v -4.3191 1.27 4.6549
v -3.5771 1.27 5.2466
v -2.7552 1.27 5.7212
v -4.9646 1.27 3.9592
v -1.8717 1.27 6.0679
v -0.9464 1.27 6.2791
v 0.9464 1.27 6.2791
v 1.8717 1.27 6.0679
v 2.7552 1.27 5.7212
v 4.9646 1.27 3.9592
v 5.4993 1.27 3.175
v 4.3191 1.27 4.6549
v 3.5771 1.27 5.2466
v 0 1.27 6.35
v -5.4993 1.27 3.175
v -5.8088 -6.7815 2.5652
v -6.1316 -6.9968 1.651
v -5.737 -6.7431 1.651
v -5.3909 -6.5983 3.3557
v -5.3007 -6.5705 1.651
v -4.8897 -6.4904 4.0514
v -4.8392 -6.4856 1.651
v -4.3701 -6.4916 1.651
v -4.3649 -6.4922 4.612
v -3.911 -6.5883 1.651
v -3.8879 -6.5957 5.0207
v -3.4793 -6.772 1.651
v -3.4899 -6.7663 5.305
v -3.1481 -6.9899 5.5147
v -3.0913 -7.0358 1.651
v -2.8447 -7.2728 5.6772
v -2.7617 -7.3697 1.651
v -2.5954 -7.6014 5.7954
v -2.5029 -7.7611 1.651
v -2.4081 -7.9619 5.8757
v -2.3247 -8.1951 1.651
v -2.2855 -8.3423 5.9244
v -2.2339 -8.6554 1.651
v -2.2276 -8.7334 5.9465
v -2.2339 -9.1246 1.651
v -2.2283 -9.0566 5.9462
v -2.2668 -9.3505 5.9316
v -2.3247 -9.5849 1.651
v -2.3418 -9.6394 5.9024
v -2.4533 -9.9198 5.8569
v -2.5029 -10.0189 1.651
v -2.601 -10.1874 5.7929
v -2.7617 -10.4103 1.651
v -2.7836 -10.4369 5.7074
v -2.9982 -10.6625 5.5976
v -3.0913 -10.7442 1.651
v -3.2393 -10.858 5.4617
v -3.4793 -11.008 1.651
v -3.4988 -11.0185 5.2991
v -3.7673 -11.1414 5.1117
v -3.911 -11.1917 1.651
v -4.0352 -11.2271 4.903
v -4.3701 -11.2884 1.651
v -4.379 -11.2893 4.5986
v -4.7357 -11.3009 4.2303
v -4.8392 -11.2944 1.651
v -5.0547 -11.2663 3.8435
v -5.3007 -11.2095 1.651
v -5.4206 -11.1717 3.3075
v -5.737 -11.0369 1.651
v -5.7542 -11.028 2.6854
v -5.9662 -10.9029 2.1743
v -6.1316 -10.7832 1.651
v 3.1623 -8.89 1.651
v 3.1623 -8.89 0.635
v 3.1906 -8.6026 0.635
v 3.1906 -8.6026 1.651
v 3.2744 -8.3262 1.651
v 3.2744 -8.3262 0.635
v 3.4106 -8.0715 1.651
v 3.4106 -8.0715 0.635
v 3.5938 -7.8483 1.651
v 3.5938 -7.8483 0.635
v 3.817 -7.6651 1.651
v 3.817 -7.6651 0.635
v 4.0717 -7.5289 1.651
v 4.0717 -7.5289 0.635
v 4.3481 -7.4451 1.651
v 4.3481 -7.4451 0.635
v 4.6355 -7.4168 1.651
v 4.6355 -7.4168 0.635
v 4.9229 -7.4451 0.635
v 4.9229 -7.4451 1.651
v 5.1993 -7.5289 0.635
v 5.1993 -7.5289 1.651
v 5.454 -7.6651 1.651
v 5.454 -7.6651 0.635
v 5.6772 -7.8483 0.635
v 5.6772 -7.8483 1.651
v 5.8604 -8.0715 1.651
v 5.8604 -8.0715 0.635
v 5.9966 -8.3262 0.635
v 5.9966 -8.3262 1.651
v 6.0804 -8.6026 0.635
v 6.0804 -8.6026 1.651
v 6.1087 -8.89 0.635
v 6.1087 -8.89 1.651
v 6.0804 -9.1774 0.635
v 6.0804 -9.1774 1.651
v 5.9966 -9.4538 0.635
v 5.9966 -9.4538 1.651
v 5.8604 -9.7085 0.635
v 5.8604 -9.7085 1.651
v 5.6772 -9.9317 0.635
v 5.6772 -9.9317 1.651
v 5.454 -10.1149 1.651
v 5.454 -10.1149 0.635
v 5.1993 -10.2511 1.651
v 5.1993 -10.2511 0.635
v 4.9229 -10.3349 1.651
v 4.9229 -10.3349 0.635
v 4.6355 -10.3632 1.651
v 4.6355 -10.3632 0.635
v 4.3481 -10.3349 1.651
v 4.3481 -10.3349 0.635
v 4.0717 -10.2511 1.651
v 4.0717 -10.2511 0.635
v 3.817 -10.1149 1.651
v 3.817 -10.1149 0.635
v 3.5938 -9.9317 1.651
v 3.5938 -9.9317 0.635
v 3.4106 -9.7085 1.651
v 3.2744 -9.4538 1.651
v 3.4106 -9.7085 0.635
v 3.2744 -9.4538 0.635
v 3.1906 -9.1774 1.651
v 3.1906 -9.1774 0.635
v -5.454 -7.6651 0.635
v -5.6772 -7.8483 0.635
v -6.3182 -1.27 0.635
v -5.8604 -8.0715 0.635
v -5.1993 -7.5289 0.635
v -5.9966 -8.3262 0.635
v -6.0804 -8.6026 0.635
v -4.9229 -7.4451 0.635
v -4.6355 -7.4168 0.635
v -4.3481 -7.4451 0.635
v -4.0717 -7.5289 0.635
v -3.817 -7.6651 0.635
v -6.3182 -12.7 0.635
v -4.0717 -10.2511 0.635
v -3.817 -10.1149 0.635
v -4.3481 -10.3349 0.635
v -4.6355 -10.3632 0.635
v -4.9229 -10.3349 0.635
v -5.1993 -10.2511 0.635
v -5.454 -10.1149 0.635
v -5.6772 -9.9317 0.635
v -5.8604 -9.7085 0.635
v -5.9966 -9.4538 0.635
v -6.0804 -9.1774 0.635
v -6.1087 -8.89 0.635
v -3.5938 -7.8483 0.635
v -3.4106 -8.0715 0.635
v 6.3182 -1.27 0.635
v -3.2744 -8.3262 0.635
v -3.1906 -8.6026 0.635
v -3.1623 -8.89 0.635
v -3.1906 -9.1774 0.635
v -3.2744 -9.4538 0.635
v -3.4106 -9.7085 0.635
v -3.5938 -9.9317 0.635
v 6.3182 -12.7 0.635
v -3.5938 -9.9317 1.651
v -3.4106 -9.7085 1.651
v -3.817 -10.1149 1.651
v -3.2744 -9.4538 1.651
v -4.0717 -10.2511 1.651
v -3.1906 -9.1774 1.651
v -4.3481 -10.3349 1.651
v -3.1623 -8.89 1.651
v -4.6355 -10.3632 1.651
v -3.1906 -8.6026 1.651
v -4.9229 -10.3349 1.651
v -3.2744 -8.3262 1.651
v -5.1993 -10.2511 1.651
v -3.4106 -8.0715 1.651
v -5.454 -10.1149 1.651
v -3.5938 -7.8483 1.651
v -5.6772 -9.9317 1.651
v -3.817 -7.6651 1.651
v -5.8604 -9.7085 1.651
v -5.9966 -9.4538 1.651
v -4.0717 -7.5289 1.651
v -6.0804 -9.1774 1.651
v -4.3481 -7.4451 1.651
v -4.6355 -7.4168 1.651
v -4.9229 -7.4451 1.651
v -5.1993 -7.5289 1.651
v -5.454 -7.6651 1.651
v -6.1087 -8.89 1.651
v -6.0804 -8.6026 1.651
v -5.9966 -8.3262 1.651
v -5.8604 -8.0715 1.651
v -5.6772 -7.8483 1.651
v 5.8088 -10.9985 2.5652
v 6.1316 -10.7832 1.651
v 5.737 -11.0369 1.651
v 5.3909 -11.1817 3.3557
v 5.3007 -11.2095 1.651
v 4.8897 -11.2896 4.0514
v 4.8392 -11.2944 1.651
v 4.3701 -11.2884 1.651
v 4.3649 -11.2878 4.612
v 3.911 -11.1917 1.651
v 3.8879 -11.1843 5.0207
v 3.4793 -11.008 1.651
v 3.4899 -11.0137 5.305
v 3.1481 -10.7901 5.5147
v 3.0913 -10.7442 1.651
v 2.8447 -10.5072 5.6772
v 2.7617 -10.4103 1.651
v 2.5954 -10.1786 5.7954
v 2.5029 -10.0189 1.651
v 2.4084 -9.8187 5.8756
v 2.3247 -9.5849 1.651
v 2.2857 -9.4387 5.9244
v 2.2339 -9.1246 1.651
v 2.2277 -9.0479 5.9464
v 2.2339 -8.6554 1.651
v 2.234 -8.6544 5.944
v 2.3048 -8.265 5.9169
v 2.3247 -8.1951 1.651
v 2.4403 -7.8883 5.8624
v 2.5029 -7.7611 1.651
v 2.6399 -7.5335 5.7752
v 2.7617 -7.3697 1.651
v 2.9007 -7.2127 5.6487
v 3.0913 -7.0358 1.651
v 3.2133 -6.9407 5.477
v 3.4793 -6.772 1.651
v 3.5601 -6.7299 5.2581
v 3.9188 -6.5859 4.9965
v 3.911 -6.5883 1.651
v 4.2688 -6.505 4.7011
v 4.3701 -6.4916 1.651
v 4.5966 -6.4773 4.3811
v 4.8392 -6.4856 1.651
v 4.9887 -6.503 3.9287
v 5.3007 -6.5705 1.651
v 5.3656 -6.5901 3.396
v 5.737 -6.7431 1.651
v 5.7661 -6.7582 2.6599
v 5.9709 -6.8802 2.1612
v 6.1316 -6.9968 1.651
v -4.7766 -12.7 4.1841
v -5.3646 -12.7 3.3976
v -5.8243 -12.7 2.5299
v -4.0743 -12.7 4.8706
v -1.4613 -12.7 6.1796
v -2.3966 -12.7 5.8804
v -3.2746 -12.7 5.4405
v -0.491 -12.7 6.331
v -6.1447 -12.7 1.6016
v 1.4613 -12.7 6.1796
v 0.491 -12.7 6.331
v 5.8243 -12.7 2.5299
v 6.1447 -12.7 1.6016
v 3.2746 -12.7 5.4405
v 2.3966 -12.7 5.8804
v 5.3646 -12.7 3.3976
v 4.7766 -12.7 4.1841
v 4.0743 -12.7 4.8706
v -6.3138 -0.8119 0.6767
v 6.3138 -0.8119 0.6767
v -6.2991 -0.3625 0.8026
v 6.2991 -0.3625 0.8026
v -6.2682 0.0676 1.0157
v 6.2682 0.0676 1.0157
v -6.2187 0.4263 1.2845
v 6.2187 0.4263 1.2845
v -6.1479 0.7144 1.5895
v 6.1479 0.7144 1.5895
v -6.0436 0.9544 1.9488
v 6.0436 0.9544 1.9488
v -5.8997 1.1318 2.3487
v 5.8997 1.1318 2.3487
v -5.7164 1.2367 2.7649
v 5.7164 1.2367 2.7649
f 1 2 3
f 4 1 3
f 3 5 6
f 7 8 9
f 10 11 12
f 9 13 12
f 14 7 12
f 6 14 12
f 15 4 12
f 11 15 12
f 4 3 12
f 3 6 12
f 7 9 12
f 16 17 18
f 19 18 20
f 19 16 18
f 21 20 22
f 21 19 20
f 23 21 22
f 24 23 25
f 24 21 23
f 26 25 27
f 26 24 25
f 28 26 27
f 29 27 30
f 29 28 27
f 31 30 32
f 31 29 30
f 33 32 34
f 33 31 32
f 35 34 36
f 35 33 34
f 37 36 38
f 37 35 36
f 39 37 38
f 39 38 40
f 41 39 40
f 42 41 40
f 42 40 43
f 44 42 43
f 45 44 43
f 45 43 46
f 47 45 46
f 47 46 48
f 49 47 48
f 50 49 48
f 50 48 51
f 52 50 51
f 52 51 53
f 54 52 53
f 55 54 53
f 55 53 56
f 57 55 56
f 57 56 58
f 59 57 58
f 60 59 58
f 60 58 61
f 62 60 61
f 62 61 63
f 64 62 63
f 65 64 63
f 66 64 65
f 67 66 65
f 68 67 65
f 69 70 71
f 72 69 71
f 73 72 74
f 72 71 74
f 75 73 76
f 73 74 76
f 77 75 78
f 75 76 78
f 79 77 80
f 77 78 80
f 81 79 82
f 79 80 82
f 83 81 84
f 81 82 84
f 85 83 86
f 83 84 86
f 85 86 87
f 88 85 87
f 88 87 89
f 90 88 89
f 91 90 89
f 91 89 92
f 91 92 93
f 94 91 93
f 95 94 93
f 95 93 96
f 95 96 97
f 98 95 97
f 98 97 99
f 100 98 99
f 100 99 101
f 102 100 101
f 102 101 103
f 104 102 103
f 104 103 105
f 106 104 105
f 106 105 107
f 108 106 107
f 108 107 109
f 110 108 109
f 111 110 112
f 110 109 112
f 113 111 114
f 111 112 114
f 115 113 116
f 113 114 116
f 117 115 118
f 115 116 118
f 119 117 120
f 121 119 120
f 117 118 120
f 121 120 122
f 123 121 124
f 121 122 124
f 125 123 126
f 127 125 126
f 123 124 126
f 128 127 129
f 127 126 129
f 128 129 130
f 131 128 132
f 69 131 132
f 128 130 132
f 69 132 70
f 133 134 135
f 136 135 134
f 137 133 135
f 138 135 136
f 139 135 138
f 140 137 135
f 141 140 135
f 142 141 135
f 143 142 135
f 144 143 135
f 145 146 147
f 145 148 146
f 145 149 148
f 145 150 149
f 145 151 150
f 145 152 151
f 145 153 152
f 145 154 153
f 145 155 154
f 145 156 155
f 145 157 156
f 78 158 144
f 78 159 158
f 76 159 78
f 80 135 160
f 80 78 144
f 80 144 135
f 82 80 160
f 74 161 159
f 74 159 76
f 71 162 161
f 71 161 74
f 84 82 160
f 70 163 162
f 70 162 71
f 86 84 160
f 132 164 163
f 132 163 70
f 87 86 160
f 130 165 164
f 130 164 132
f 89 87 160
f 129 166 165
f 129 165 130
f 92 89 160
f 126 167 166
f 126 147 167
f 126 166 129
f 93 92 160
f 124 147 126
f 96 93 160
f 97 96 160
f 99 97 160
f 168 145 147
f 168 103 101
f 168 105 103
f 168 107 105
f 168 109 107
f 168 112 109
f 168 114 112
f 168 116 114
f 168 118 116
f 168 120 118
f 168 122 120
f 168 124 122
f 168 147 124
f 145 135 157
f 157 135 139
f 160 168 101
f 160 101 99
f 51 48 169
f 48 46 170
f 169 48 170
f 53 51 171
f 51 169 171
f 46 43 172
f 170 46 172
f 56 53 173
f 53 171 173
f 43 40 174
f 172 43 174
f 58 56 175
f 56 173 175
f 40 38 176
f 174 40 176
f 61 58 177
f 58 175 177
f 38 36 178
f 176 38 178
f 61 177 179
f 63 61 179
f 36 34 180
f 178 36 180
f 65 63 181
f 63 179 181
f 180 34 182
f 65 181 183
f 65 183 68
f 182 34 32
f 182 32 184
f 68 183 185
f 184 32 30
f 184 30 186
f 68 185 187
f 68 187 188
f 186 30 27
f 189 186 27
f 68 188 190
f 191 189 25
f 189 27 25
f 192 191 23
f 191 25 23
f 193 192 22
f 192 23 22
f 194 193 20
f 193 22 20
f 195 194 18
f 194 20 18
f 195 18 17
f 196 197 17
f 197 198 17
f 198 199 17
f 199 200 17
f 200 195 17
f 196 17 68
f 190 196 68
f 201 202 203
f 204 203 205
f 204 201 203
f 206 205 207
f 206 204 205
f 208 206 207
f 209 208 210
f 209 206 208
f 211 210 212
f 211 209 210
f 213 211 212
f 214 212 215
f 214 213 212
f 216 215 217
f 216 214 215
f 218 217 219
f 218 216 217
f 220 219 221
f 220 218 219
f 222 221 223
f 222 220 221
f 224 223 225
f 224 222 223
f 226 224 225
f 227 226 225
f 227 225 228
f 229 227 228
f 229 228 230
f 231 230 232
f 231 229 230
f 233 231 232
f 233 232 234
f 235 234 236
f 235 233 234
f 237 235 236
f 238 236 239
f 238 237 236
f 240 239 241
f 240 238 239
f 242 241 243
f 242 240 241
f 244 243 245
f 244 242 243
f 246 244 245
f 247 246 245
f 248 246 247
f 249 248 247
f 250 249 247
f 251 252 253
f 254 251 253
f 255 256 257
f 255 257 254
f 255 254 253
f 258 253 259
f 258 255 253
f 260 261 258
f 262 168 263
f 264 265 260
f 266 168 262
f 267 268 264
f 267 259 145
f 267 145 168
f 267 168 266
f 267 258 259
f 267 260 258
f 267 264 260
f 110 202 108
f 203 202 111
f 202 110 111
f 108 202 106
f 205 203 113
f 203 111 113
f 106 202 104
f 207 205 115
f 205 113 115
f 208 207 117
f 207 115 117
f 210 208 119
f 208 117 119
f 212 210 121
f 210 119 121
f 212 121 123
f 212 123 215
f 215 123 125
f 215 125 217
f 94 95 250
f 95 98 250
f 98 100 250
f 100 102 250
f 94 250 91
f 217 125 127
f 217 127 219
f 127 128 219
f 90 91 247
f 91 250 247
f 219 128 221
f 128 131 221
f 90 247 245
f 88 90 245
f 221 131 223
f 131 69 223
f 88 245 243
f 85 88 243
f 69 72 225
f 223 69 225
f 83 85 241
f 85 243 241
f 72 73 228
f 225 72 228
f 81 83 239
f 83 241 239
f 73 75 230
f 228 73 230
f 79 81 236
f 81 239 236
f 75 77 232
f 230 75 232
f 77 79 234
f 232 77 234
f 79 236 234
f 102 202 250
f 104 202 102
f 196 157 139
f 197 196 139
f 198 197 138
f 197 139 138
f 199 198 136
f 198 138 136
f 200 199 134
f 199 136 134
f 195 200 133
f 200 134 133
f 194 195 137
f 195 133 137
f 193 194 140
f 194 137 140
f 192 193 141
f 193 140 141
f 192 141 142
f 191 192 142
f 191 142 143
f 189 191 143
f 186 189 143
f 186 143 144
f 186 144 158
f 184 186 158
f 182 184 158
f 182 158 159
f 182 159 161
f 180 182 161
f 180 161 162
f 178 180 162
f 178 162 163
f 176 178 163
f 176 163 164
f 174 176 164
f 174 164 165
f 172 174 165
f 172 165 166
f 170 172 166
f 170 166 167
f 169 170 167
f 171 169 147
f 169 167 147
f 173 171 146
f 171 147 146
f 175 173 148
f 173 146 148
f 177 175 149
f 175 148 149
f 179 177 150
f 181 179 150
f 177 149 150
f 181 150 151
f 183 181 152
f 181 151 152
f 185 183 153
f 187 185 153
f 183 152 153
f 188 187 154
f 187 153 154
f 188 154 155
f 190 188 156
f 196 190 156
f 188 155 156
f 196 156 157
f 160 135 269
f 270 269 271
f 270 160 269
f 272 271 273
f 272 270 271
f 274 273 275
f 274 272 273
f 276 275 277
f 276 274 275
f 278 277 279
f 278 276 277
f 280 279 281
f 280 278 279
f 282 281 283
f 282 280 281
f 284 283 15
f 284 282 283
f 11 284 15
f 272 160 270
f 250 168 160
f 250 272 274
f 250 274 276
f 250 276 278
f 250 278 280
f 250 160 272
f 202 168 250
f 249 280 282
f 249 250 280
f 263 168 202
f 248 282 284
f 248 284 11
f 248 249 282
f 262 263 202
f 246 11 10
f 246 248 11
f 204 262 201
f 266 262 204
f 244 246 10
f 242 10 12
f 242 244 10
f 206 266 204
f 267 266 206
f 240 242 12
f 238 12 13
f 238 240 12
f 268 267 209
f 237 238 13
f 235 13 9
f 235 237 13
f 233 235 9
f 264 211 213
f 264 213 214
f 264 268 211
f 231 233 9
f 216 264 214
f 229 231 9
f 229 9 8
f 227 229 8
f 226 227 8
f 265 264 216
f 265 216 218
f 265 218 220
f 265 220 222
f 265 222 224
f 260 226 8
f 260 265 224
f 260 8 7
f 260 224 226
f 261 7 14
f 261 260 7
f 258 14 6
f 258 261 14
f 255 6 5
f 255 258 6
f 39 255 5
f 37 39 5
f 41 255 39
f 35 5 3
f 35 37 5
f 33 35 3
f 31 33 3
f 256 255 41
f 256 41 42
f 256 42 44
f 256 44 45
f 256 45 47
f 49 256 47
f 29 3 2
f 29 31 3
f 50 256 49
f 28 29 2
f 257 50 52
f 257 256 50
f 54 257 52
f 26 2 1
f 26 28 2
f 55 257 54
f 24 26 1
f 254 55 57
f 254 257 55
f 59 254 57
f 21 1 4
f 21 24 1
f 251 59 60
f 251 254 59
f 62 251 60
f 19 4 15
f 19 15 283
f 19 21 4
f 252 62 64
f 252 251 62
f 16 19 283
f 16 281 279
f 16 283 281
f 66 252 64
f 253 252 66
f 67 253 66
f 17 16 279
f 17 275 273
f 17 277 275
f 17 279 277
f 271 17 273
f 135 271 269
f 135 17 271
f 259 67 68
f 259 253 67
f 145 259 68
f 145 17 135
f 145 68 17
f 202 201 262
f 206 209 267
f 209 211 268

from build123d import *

# Parameters (mm, degrees)
BOSS_EXTRUDE1_DEPTH = 13.97
FILLET1_R           = 2.54
SKETCH4_R           = 1.4732
CUT_EXTRUDE1_DEPTH  = 6.7150001
SKETCH6_R           = 2.413
CUT_EXTRUDE3_DEPTH  = 5.334


with BuildPart() as part:
    # Sketch3 → Boss-Extrude1 (new body)
    with BuildSketch(Plane.XZ.offset(12.7)):
        with BuildLine():
            ThreePointArc((6.318170226, 0.635), (0, 6.35), (-6.318170226, 0.635))
            Line((-6.318170226, 0.635), (6.318170226, 0.635))
        make_face()
    extrude(amount=-BOSS_EXTRUDE1_DEPTH)

    # Fillet1
    fillet1_edges = [part.edges().sort_by_distance(p)[0] for p in [
        (0, 1.27, 0.635),
    ]]
    fillet(fillet1_edges, radius=FILLET1_R)

    # Sketch4 → Cut-Extrude1 (cut, through all)
    with BuildSketch(Plane(origin=(0, 0, 0.635), x_dir=(-1, 0, 0), z_dir=(0, 0, -1))):
        with Locations((4.6355, -8.89)):
            Circle(SKETCH4_R)
        with Locations((-4.6355, -8.89)):
            Circle(SKETCH4_R)
    extrude(amount=-CUT_EXTRUDE1_DEPTH, mode=Mode.SUBTRACT)

    # Sketch6 → Cut-Extrude3 (cut)
    with BuildSketch(Plane(origin=(0, 0, 6.985), x_dir=(-1, 0, 0), z_dir=(0, 0, -1))):
        with Locations((4.6355, -8.89)):
            Circle(SKETCH6_R)
        with Locations((-4.6355, -8.89)):
            Circle(SKETCH6_R)
    extrude(amount=CUT_EXTRUDE3_DEPTH, mode=Mode.SUBTRACT)


solid = part.part
